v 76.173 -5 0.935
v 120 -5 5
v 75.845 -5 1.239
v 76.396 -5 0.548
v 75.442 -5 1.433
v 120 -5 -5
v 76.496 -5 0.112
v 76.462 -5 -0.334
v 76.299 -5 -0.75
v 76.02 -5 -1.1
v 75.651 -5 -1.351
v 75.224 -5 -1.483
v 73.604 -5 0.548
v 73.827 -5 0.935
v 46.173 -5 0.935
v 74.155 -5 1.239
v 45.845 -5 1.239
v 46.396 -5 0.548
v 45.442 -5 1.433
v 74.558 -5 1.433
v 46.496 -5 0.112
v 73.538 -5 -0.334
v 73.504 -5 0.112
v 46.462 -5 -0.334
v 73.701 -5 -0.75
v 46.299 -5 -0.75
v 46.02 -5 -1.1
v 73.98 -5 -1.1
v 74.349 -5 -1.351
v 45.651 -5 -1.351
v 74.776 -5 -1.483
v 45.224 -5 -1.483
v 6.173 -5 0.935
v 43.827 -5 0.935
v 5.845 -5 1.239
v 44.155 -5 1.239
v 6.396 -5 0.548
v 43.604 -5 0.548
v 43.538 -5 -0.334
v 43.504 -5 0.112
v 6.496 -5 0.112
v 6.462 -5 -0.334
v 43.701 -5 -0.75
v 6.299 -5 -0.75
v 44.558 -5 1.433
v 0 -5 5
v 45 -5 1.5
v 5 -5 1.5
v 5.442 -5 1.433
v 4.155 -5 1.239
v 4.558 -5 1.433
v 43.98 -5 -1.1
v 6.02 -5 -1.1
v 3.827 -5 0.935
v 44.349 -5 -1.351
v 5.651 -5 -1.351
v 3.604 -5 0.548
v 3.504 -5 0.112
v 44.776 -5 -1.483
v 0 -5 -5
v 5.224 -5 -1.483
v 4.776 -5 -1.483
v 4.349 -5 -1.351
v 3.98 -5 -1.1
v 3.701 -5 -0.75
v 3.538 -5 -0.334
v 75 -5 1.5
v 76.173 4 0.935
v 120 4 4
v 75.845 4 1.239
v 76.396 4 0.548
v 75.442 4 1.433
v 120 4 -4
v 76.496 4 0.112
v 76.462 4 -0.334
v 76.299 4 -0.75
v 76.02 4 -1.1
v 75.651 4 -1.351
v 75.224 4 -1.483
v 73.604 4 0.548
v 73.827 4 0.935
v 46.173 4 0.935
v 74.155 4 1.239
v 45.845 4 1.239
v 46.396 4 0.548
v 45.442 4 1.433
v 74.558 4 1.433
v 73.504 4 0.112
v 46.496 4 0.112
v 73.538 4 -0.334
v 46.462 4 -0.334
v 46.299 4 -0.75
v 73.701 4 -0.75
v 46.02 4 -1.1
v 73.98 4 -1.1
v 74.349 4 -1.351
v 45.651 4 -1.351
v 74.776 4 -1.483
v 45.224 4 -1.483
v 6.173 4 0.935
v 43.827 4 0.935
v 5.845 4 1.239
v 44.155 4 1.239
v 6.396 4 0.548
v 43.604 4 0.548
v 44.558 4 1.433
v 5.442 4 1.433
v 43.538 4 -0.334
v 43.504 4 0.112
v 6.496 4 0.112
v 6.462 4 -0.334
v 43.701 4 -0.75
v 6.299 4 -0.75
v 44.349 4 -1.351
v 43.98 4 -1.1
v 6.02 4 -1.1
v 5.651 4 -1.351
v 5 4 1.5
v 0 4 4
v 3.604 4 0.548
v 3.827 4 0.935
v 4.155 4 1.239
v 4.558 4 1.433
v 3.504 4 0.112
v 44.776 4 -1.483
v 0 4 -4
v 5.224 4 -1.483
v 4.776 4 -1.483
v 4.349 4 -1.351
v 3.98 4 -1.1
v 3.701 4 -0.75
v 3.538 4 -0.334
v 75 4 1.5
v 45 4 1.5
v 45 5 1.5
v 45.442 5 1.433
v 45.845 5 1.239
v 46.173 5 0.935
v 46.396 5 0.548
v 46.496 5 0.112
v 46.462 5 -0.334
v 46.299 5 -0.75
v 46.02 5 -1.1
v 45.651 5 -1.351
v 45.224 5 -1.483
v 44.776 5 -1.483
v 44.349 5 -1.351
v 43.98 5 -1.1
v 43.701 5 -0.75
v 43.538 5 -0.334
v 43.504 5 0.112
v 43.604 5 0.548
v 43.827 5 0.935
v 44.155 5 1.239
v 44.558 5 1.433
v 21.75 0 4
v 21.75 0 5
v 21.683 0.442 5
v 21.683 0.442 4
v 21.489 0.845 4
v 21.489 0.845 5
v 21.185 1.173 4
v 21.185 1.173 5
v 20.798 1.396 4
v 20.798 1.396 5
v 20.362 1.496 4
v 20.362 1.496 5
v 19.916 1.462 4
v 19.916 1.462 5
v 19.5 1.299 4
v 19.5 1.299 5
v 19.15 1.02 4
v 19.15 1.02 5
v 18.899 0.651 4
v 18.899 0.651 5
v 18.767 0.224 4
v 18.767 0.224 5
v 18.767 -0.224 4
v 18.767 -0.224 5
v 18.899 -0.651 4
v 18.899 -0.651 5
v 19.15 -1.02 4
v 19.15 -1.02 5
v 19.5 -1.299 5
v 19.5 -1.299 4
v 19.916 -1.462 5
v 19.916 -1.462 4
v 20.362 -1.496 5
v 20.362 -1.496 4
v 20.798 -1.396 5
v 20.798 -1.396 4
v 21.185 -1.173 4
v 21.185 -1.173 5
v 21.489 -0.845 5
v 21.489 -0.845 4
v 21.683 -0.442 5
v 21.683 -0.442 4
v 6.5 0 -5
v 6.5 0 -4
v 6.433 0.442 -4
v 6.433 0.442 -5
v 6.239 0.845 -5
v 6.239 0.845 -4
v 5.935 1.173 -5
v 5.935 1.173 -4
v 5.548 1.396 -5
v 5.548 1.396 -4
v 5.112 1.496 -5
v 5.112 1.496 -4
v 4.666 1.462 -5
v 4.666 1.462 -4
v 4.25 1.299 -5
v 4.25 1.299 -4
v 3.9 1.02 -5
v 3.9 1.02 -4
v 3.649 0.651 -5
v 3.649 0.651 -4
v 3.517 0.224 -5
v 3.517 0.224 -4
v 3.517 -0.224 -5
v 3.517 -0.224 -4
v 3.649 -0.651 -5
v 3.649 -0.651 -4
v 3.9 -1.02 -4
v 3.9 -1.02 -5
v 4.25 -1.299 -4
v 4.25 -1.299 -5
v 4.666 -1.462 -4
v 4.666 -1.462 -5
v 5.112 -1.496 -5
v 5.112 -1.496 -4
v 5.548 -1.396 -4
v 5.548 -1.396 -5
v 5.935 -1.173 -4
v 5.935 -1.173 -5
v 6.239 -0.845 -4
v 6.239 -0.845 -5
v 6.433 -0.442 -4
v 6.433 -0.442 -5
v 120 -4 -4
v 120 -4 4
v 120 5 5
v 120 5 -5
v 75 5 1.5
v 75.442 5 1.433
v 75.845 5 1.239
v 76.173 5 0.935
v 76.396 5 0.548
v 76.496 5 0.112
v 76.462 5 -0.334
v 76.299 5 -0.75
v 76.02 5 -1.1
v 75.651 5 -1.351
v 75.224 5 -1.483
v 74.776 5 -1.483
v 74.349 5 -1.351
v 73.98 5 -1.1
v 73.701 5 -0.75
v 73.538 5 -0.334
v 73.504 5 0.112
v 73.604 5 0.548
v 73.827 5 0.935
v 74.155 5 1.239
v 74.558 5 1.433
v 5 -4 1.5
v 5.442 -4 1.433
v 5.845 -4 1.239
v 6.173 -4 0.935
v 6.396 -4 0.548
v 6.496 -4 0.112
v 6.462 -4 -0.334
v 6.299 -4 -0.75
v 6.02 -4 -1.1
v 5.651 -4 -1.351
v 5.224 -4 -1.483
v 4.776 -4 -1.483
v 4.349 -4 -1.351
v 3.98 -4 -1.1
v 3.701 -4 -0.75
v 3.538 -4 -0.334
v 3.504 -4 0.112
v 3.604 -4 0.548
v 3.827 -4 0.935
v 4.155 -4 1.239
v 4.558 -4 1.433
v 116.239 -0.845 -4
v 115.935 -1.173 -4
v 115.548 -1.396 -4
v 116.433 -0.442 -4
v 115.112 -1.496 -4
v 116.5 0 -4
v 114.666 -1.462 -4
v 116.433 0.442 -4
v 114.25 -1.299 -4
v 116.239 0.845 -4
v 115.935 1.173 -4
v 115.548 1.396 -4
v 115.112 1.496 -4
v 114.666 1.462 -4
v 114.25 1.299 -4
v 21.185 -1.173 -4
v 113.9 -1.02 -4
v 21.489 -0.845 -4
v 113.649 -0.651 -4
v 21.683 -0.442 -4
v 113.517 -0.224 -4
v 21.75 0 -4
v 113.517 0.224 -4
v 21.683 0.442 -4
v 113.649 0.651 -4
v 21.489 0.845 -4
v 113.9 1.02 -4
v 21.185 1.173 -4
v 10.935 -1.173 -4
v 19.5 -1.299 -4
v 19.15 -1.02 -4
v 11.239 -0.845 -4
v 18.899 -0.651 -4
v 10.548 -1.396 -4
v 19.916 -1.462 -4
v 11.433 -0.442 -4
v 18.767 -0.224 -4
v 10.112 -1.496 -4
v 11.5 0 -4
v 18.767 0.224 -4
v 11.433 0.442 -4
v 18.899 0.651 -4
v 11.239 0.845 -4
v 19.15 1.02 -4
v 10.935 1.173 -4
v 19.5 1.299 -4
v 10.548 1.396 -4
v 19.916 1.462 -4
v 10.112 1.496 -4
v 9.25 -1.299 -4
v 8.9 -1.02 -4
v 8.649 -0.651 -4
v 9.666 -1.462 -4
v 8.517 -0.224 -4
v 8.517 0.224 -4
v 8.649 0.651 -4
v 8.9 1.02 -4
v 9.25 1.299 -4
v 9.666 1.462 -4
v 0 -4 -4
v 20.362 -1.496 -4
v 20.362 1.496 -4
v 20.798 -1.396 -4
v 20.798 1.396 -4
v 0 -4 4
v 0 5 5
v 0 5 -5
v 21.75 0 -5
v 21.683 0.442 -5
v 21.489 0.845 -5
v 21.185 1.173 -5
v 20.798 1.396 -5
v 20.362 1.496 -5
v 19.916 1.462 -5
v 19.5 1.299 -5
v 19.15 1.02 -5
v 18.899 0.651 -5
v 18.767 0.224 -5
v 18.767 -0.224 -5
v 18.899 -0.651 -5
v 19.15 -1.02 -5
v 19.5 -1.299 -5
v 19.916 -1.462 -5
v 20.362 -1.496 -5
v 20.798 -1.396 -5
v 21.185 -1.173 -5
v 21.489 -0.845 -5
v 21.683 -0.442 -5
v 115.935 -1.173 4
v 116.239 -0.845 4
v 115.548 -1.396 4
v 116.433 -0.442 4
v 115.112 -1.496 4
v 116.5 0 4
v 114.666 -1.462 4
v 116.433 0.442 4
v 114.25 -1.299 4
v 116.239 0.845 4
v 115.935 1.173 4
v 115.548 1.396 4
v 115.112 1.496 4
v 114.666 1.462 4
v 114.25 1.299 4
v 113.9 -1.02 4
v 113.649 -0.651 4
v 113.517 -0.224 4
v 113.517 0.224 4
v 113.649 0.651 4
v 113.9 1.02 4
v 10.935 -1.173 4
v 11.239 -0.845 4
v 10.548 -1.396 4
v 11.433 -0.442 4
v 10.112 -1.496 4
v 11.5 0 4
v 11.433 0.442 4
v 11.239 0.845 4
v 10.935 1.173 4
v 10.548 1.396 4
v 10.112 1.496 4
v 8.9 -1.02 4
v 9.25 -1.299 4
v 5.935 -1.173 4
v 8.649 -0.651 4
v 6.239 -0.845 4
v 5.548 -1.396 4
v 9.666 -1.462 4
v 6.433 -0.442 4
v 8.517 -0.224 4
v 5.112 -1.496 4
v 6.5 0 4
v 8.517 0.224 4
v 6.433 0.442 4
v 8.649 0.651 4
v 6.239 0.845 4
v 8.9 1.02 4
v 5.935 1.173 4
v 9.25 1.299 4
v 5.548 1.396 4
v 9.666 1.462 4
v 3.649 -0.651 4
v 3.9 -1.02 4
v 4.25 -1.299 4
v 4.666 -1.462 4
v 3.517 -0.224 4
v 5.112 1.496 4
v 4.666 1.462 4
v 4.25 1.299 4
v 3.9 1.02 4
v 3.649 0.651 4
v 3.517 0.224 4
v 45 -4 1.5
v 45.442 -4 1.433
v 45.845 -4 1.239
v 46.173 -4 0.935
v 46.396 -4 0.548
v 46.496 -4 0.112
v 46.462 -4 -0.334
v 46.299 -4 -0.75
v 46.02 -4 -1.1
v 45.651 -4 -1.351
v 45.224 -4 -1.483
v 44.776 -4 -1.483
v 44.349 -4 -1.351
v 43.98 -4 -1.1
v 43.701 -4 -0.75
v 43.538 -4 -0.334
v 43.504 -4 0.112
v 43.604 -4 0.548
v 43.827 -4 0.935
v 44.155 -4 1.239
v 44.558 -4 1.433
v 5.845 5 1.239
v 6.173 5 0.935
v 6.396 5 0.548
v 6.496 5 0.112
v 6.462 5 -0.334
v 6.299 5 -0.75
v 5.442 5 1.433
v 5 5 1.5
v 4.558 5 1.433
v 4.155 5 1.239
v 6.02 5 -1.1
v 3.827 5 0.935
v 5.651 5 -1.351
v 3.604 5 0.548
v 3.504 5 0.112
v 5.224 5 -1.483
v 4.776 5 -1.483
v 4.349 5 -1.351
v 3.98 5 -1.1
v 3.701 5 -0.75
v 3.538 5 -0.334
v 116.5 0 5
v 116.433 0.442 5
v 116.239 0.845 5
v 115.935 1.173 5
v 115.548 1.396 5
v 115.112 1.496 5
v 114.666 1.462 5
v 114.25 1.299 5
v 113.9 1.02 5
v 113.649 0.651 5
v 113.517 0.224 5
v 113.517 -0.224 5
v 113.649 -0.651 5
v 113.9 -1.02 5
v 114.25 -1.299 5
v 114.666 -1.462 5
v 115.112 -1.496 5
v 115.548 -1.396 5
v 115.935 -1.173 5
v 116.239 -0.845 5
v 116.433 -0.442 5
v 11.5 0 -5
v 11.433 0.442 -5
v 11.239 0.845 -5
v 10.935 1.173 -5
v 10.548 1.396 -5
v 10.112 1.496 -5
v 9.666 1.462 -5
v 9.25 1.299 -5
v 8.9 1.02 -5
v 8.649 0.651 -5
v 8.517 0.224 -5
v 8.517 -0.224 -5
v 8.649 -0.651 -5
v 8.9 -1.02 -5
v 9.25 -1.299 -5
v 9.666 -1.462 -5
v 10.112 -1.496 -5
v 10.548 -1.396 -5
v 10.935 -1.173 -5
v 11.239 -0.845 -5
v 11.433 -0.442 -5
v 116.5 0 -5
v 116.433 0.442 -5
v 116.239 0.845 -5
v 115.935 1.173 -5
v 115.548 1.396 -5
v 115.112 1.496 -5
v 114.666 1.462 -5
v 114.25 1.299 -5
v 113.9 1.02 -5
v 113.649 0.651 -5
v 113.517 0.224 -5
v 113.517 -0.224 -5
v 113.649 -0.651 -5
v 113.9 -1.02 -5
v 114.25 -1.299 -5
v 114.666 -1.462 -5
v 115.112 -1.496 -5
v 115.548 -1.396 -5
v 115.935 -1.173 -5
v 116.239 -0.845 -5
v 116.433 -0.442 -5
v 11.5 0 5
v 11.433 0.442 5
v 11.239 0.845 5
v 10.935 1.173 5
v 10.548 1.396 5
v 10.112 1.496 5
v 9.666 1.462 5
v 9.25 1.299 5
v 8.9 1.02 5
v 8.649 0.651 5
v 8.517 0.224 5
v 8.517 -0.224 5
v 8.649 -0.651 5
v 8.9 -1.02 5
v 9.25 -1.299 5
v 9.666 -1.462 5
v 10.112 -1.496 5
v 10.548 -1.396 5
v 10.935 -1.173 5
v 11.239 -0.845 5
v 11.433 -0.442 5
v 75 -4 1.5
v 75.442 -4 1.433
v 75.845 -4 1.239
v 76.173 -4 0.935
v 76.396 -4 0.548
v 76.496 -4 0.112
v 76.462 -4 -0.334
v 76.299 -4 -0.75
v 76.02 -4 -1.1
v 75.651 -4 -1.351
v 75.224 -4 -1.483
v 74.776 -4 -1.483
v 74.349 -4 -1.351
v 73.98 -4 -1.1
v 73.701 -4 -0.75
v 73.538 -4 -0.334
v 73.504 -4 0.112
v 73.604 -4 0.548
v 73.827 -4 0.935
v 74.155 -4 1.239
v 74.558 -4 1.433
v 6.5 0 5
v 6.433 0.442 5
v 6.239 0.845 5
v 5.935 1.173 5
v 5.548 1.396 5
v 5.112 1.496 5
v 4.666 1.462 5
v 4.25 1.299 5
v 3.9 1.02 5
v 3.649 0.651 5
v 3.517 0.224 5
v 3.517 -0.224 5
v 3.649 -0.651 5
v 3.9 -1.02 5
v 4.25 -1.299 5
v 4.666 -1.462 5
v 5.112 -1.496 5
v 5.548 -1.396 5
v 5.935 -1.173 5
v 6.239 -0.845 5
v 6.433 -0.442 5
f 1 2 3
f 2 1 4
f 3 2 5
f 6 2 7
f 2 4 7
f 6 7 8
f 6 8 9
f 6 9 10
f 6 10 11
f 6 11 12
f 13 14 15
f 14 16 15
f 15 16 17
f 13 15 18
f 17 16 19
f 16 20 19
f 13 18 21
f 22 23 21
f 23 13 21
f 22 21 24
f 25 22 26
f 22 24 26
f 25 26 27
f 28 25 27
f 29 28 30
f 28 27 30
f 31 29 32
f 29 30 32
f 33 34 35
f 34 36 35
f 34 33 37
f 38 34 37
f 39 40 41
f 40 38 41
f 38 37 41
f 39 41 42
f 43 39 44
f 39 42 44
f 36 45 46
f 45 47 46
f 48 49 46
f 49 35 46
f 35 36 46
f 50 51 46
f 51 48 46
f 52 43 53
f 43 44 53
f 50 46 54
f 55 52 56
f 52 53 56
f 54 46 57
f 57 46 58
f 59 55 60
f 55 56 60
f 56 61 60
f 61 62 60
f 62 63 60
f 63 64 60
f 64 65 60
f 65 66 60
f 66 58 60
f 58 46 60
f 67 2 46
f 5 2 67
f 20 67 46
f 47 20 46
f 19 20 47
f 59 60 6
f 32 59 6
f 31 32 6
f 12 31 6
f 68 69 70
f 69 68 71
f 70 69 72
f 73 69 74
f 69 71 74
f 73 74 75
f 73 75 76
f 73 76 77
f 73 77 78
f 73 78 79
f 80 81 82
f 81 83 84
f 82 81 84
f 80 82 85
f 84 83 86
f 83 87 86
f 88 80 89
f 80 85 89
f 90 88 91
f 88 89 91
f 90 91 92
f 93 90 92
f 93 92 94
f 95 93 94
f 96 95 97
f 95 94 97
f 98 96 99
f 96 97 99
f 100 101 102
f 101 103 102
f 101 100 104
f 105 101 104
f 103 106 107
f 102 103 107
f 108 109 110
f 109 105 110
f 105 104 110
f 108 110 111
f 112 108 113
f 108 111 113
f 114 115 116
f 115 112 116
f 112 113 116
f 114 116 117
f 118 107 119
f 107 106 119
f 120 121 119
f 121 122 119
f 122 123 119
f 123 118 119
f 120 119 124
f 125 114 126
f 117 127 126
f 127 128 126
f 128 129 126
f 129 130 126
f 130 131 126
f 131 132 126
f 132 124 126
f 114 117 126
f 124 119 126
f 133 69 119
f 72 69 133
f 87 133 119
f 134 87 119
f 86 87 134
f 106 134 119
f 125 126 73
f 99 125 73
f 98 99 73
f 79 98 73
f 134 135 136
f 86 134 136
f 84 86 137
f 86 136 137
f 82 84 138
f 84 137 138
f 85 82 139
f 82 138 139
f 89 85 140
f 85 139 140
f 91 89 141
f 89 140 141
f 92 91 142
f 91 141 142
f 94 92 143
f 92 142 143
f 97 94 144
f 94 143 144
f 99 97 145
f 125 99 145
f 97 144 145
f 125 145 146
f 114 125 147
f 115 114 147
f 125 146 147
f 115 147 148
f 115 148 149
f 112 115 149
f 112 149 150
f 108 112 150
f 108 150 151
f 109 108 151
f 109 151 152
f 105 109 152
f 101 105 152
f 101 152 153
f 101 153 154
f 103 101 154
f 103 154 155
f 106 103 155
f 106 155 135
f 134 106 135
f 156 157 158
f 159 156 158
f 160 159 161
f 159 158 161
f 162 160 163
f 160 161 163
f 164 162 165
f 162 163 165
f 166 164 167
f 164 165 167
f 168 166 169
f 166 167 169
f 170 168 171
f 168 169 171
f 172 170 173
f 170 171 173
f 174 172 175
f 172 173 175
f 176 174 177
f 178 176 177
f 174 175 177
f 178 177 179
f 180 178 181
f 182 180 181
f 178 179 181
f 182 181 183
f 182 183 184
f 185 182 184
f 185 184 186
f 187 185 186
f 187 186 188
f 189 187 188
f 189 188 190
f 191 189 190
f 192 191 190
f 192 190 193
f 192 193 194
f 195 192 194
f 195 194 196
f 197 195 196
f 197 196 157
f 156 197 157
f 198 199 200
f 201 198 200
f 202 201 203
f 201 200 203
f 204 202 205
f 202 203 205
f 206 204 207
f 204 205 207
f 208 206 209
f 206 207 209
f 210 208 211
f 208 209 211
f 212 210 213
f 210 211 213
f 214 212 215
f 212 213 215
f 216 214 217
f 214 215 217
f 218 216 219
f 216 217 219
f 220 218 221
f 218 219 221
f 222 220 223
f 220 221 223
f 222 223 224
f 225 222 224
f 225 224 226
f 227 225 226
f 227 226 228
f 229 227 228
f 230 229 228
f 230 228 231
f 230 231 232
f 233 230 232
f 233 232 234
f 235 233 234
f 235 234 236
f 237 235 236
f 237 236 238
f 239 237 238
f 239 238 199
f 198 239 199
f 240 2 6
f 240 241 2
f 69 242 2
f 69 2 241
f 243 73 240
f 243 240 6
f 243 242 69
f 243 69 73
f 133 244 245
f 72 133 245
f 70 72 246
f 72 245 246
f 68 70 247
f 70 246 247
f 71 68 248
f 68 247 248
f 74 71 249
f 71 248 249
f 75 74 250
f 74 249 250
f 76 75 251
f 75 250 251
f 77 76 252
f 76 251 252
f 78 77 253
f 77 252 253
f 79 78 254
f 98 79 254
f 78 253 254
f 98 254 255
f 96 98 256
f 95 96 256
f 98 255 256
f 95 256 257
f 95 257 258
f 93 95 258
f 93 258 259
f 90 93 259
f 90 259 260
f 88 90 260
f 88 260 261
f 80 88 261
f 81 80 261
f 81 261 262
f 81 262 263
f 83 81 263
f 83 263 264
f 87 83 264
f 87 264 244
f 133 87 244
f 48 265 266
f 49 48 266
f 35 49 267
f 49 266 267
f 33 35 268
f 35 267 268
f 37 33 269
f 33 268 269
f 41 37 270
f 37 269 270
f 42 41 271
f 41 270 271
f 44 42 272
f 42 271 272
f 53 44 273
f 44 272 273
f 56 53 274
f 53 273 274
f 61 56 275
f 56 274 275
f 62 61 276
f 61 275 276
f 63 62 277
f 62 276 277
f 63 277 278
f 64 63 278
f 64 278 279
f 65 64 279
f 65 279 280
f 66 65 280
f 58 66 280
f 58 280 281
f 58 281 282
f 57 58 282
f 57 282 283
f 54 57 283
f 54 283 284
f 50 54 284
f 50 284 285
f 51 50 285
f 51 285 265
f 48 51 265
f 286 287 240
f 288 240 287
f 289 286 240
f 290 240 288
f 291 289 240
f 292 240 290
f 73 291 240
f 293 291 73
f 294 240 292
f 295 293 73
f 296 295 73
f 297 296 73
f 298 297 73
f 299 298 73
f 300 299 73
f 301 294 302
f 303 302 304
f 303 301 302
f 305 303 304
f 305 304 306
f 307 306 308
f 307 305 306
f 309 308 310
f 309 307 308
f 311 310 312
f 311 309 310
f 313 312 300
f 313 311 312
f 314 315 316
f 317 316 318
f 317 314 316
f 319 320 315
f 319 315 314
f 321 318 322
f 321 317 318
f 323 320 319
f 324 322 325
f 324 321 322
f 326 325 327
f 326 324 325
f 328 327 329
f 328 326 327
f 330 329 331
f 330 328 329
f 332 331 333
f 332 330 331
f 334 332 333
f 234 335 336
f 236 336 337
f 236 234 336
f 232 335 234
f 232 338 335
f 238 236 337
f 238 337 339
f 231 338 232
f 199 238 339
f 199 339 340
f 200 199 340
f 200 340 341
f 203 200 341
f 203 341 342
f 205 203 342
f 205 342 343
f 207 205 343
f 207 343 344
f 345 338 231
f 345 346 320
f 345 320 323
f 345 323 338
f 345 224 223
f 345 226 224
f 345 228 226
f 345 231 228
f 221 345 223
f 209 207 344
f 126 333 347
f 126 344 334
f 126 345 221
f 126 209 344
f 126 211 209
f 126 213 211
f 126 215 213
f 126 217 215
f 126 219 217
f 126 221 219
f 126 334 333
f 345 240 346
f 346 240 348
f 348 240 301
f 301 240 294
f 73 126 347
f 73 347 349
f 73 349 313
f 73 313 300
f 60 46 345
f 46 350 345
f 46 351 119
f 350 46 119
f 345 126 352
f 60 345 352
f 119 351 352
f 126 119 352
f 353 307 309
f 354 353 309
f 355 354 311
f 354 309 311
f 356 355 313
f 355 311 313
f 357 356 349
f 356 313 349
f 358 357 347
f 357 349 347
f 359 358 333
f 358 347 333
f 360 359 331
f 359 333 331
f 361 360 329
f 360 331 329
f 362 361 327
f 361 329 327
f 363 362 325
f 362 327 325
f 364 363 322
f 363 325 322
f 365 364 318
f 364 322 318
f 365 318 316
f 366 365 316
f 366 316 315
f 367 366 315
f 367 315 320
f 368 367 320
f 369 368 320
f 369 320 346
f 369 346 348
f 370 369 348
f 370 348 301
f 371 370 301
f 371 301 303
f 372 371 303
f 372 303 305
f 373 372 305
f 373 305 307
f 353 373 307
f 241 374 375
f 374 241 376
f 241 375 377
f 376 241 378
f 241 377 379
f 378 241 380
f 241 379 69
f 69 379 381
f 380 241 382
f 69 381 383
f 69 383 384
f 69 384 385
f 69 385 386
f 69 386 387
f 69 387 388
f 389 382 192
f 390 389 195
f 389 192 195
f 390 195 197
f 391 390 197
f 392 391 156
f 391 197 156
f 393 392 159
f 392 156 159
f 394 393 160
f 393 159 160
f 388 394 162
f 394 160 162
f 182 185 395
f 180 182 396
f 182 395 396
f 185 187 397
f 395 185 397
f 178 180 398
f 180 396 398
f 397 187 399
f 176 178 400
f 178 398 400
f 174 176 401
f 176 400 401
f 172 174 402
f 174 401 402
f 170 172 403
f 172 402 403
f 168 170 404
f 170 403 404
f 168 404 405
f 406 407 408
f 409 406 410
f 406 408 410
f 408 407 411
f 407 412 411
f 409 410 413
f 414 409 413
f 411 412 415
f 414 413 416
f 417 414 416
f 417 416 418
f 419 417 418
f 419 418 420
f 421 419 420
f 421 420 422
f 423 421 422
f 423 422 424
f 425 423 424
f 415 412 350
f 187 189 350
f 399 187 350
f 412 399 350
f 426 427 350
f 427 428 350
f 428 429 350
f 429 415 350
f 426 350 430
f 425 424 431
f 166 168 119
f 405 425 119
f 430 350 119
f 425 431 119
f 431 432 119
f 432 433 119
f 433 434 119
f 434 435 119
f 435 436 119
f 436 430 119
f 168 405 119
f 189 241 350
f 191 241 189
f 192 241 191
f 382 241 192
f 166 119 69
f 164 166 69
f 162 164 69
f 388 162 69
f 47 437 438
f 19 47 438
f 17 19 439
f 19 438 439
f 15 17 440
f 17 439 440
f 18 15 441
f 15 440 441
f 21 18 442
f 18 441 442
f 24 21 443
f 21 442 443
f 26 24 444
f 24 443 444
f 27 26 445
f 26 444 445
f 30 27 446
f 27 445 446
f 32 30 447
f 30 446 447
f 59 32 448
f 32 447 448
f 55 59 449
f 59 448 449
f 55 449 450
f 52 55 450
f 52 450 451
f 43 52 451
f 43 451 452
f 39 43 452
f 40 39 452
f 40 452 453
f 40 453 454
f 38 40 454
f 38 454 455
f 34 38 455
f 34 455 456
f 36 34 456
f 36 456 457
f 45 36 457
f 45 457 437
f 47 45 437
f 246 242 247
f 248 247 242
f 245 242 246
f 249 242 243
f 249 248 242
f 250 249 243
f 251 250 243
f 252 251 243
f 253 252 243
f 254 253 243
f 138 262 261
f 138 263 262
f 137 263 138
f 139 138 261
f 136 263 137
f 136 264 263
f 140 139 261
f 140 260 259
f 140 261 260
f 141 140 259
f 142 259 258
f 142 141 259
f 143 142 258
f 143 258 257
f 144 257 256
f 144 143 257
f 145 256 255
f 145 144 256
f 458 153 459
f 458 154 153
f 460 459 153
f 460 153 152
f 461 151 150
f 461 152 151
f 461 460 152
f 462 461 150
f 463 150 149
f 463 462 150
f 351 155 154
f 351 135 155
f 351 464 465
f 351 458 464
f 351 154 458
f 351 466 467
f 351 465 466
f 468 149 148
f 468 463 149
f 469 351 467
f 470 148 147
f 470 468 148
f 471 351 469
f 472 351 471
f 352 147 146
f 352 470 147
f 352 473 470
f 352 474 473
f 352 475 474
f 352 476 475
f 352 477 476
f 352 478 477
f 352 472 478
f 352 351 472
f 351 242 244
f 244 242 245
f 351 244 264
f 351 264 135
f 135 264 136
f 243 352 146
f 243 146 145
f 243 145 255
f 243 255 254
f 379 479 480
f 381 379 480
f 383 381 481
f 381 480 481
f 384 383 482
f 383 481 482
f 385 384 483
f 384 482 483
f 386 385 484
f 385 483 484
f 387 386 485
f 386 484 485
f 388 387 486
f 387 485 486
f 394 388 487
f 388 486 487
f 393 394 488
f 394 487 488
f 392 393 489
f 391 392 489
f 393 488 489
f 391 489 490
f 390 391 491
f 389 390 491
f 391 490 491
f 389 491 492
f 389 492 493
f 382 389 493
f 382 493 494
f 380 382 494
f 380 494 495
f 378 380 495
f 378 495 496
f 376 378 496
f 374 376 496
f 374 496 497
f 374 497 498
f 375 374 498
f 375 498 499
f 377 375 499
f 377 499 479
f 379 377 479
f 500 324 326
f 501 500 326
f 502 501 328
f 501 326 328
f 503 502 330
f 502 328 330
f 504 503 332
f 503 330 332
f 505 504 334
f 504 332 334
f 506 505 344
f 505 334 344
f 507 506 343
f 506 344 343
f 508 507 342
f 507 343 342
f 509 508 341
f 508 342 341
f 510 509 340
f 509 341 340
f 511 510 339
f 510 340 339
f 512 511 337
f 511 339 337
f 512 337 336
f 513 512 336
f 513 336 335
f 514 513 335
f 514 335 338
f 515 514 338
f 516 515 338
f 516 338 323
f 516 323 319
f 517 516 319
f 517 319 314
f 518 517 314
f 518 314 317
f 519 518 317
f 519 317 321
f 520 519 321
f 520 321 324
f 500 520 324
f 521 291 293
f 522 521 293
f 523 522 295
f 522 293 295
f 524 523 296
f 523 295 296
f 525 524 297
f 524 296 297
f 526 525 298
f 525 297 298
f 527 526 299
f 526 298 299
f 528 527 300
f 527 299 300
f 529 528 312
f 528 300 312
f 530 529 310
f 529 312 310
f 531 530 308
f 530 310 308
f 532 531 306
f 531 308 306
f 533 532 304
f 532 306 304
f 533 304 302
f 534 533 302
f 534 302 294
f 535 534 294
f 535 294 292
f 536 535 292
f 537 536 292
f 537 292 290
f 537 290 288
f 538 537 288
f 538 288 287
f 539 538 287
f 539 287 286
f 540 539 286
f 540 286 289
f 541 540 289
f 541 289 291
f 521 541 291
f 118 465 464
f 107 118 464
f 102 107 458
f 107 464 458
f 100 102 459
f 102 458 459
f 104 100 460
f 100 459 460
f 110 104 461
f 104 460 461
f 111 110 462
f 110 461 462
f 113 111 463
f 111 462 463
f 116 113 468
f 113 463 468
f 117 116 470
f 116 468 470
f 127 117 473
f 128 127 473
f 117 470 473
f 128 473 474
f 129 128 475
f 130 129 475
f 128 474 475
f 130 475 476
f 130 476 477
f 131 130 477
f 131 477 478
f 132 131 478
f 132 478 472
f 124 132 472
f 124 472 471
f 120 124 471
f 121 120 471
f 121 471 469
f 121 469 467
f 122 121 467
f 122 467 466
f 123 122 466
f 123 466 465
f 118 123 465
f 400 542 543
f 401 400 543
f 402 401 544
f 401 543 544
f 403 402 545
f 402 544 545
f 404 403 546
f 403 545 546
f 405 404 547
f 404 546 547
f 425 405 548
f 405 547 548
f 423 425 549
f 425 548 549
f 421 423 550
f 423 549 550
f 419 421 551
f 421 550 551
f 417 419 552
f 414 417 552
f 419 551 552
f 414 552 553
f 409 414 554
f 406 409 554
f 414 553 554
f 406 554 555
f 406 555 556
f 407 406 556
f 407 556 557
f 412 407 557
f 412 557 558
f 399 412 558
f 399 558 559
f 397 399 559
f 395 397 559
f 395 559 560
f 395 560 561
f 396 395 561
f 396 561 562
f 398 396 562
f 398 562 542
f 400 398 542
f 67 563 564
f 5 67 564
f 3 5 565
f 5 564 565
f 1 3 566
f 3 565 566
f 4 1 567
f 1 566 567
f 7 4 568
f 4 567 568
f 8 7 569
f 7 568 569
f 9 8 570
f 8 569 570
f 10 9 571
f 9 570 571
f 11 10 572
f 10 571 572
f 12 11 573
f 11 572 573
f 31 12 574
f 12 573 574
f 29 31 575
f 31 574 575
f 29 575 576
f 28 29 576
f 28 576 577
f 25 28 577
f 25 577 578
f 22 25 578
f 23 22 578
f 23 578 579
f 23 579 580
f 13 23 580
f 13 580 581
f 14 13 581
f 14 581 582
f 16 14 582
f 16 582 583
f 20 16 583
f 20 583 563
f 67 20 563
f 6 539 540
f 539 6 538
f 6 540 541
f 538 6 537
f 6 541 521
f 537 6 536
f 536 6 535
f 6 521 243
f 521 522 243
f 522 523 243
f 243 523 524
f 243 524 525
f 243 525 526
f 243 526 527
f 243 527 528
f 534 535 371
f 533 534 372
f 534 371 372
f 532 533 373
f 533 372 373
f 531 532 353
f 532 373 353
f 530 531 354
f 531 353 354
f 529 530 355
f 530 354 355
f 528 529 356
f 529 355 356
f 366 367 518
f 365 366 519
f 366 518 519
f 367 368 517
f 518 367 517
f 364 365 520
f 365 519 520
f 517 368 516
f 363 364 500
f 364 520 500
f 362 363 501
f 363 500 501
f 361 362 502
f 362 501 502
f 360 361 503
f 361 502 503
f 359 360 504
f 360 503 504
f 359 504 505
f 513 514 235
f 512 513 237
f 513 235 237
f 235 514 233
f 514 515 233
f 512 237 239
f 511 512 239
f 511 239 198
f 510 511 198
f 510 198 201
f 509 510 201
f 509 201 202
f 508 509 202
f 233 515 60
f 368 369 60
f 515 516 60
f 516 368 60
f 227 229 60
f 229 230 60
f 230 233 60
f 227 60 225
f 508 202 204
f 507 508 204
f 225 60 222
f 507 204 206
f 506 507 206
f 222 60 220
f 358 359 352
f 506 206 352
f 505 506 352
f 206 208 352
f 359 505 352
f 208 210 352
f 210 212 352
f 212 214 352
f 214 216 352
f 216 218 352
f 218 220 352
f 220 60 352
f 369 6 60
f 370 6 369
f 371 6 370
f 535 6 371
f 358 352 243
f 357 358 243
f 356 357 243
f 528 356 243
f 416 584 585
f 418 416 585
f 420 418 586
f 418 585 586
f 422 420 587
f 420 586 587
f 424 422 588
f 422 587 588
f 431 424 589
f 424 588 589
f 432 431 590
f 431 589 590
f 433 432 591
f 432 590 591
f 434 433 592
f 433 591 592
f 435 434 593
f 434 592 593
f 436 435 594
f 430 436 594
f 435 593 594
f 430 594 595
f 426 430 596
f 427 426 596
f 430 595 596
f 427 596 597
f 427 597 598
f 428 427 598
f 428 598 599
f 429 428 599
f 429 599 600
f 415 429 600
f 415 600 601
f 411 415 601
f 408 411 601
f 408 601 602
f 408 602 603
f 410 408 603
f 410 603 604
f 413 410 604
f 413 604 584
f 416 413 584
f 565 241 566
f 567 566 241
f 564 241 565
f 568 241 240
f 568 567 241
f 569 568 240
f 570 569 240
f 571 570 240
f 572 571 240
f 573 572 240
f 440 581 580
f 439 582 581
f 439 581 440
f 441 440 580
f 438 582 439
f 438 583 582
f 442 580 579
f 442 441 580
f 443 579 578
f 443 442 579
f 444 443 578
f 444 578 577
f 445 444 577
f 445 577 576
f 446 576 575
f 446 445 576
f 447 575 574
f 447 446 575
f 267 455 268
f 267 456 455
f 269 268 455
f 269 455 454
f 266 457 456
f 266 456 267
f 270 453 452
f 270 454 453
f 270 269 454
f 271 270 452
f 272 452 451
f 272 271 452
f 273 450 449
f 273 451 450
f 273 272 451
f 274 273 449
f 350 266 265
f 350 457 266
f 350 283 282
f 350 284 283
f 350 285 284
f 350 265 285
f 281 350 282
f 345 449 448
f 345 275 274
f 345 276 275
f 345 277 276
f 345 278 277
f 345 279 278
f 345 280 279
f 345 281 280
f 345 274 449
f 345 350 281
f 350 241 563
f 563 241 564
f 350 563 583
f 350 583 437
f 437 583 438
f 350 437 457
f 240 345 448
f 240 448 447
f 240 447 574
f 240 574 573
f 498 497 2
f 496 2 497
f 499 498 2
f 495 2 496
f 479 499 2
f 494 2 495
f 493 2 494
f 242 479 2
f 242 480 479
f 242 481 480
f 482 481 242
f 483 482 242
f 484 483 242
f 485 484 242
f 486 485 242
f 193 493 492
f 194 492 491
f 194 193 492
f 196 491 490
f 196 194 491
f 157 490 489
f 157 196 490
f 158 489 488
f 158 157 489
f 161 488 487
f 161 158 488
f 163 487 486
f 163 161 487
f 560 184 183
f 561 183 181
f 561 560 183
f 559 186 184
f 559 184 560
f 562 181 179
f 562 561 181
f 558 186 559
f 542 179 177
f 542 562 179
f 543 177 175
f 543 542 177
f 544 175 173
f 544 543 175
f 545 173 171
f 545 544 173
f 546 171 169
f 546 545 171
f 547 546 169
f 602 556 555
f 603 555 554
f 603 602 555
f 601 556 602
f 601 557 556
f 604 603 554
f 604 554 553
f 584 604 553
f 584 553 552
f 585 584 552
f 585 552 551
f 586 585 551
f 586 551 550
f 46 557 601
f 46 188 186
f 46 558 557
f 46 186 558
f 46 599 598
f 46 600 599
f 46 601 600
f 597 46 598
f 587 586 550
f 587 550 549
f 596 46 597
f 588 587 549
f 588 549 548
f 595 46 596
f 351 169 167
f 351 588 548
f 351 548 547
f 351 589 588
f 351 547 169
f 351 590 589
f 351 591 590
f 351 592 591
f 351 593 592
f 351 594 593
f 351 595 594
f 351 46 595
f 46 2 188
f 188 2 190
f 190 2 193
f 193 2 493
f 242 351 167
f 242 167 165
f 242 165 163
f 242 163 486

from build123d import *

# Parameters (mm, degrees)
SKETCH_1_W          = 10
SKETCH_1_H          = 10
SKETCH_1_W_2        = 8
SKETCH_1_H_2        = 8
EXTRUDE_1_DEPTH     = 120
SKETCH_3_R          = 1.5
CUT_EXTRUDE_1_DEPTH = 121.519707932
SKETCH_4_R          = 1.5
CUT_EXTRUDE_2_DEPTH = 121.519707932


with BuildPart() as part:
    # ｽｹｯﾁ1 → 押し出し-薄板1 (new body)
    with BuildSketch(Plane(origin=(0, 0, 0), x_dir=(0, 0, -1), z_dir=(1, 0, 0))):
        Rectangle(SKETCH_1_W, SKETCH_1_H)
        Rectangle(SKETCH_1_W_2, SKETCH_1_H_2, mode=Mode.SUBTRACT)
    extrude(amount=EXTRUDE_1_DEPTH)

    # ｽｹｯﾁ3 → ｶｯﾄ - 押し出し1 (cut, through all)
    with BuildSketch(Plane.XY.offset(5)):
        with Locations((115, 0)):
            Circle(SKETCH_3_R)
        with Locations((10, 0)):
            Circle(SKETCH_3_R)
        with Locations((20.25, 0)):
            Circle(SKETCH_3_R)
        with Locations((5, 0)):
            Circle(SKETCH_3_R)
    extrude(amount=-CUT_EXTRUDE_1_DEPTH, mode=Mode.SUBTRACT)

    # ｽｹｯﾁ4 → ｶｯﾄ - 押し出し2 (cut, through all)
    with BuildSketch(Plane(origin=(0, 5, 0), x_dir=(1, 0, 0), z_dir=(0, 1, 0))):
        with Locations(Location((5, 0, 0), (0, 0, 270))):
            Circle(SKETCH_4_R)
        with Locations(Location((45, 0, 0), (0, 0, 270))):
            Circle(SKETCH_4_R)
        with Locations(Location((75, 0, 0), (0, 0, 270))):
            Circle(SKETCH_4_R)
    extrude(amount=-CUT_EXTRUDE_2_DEPTH, mode=Mode.SUBTRACT)


solid = part.part
